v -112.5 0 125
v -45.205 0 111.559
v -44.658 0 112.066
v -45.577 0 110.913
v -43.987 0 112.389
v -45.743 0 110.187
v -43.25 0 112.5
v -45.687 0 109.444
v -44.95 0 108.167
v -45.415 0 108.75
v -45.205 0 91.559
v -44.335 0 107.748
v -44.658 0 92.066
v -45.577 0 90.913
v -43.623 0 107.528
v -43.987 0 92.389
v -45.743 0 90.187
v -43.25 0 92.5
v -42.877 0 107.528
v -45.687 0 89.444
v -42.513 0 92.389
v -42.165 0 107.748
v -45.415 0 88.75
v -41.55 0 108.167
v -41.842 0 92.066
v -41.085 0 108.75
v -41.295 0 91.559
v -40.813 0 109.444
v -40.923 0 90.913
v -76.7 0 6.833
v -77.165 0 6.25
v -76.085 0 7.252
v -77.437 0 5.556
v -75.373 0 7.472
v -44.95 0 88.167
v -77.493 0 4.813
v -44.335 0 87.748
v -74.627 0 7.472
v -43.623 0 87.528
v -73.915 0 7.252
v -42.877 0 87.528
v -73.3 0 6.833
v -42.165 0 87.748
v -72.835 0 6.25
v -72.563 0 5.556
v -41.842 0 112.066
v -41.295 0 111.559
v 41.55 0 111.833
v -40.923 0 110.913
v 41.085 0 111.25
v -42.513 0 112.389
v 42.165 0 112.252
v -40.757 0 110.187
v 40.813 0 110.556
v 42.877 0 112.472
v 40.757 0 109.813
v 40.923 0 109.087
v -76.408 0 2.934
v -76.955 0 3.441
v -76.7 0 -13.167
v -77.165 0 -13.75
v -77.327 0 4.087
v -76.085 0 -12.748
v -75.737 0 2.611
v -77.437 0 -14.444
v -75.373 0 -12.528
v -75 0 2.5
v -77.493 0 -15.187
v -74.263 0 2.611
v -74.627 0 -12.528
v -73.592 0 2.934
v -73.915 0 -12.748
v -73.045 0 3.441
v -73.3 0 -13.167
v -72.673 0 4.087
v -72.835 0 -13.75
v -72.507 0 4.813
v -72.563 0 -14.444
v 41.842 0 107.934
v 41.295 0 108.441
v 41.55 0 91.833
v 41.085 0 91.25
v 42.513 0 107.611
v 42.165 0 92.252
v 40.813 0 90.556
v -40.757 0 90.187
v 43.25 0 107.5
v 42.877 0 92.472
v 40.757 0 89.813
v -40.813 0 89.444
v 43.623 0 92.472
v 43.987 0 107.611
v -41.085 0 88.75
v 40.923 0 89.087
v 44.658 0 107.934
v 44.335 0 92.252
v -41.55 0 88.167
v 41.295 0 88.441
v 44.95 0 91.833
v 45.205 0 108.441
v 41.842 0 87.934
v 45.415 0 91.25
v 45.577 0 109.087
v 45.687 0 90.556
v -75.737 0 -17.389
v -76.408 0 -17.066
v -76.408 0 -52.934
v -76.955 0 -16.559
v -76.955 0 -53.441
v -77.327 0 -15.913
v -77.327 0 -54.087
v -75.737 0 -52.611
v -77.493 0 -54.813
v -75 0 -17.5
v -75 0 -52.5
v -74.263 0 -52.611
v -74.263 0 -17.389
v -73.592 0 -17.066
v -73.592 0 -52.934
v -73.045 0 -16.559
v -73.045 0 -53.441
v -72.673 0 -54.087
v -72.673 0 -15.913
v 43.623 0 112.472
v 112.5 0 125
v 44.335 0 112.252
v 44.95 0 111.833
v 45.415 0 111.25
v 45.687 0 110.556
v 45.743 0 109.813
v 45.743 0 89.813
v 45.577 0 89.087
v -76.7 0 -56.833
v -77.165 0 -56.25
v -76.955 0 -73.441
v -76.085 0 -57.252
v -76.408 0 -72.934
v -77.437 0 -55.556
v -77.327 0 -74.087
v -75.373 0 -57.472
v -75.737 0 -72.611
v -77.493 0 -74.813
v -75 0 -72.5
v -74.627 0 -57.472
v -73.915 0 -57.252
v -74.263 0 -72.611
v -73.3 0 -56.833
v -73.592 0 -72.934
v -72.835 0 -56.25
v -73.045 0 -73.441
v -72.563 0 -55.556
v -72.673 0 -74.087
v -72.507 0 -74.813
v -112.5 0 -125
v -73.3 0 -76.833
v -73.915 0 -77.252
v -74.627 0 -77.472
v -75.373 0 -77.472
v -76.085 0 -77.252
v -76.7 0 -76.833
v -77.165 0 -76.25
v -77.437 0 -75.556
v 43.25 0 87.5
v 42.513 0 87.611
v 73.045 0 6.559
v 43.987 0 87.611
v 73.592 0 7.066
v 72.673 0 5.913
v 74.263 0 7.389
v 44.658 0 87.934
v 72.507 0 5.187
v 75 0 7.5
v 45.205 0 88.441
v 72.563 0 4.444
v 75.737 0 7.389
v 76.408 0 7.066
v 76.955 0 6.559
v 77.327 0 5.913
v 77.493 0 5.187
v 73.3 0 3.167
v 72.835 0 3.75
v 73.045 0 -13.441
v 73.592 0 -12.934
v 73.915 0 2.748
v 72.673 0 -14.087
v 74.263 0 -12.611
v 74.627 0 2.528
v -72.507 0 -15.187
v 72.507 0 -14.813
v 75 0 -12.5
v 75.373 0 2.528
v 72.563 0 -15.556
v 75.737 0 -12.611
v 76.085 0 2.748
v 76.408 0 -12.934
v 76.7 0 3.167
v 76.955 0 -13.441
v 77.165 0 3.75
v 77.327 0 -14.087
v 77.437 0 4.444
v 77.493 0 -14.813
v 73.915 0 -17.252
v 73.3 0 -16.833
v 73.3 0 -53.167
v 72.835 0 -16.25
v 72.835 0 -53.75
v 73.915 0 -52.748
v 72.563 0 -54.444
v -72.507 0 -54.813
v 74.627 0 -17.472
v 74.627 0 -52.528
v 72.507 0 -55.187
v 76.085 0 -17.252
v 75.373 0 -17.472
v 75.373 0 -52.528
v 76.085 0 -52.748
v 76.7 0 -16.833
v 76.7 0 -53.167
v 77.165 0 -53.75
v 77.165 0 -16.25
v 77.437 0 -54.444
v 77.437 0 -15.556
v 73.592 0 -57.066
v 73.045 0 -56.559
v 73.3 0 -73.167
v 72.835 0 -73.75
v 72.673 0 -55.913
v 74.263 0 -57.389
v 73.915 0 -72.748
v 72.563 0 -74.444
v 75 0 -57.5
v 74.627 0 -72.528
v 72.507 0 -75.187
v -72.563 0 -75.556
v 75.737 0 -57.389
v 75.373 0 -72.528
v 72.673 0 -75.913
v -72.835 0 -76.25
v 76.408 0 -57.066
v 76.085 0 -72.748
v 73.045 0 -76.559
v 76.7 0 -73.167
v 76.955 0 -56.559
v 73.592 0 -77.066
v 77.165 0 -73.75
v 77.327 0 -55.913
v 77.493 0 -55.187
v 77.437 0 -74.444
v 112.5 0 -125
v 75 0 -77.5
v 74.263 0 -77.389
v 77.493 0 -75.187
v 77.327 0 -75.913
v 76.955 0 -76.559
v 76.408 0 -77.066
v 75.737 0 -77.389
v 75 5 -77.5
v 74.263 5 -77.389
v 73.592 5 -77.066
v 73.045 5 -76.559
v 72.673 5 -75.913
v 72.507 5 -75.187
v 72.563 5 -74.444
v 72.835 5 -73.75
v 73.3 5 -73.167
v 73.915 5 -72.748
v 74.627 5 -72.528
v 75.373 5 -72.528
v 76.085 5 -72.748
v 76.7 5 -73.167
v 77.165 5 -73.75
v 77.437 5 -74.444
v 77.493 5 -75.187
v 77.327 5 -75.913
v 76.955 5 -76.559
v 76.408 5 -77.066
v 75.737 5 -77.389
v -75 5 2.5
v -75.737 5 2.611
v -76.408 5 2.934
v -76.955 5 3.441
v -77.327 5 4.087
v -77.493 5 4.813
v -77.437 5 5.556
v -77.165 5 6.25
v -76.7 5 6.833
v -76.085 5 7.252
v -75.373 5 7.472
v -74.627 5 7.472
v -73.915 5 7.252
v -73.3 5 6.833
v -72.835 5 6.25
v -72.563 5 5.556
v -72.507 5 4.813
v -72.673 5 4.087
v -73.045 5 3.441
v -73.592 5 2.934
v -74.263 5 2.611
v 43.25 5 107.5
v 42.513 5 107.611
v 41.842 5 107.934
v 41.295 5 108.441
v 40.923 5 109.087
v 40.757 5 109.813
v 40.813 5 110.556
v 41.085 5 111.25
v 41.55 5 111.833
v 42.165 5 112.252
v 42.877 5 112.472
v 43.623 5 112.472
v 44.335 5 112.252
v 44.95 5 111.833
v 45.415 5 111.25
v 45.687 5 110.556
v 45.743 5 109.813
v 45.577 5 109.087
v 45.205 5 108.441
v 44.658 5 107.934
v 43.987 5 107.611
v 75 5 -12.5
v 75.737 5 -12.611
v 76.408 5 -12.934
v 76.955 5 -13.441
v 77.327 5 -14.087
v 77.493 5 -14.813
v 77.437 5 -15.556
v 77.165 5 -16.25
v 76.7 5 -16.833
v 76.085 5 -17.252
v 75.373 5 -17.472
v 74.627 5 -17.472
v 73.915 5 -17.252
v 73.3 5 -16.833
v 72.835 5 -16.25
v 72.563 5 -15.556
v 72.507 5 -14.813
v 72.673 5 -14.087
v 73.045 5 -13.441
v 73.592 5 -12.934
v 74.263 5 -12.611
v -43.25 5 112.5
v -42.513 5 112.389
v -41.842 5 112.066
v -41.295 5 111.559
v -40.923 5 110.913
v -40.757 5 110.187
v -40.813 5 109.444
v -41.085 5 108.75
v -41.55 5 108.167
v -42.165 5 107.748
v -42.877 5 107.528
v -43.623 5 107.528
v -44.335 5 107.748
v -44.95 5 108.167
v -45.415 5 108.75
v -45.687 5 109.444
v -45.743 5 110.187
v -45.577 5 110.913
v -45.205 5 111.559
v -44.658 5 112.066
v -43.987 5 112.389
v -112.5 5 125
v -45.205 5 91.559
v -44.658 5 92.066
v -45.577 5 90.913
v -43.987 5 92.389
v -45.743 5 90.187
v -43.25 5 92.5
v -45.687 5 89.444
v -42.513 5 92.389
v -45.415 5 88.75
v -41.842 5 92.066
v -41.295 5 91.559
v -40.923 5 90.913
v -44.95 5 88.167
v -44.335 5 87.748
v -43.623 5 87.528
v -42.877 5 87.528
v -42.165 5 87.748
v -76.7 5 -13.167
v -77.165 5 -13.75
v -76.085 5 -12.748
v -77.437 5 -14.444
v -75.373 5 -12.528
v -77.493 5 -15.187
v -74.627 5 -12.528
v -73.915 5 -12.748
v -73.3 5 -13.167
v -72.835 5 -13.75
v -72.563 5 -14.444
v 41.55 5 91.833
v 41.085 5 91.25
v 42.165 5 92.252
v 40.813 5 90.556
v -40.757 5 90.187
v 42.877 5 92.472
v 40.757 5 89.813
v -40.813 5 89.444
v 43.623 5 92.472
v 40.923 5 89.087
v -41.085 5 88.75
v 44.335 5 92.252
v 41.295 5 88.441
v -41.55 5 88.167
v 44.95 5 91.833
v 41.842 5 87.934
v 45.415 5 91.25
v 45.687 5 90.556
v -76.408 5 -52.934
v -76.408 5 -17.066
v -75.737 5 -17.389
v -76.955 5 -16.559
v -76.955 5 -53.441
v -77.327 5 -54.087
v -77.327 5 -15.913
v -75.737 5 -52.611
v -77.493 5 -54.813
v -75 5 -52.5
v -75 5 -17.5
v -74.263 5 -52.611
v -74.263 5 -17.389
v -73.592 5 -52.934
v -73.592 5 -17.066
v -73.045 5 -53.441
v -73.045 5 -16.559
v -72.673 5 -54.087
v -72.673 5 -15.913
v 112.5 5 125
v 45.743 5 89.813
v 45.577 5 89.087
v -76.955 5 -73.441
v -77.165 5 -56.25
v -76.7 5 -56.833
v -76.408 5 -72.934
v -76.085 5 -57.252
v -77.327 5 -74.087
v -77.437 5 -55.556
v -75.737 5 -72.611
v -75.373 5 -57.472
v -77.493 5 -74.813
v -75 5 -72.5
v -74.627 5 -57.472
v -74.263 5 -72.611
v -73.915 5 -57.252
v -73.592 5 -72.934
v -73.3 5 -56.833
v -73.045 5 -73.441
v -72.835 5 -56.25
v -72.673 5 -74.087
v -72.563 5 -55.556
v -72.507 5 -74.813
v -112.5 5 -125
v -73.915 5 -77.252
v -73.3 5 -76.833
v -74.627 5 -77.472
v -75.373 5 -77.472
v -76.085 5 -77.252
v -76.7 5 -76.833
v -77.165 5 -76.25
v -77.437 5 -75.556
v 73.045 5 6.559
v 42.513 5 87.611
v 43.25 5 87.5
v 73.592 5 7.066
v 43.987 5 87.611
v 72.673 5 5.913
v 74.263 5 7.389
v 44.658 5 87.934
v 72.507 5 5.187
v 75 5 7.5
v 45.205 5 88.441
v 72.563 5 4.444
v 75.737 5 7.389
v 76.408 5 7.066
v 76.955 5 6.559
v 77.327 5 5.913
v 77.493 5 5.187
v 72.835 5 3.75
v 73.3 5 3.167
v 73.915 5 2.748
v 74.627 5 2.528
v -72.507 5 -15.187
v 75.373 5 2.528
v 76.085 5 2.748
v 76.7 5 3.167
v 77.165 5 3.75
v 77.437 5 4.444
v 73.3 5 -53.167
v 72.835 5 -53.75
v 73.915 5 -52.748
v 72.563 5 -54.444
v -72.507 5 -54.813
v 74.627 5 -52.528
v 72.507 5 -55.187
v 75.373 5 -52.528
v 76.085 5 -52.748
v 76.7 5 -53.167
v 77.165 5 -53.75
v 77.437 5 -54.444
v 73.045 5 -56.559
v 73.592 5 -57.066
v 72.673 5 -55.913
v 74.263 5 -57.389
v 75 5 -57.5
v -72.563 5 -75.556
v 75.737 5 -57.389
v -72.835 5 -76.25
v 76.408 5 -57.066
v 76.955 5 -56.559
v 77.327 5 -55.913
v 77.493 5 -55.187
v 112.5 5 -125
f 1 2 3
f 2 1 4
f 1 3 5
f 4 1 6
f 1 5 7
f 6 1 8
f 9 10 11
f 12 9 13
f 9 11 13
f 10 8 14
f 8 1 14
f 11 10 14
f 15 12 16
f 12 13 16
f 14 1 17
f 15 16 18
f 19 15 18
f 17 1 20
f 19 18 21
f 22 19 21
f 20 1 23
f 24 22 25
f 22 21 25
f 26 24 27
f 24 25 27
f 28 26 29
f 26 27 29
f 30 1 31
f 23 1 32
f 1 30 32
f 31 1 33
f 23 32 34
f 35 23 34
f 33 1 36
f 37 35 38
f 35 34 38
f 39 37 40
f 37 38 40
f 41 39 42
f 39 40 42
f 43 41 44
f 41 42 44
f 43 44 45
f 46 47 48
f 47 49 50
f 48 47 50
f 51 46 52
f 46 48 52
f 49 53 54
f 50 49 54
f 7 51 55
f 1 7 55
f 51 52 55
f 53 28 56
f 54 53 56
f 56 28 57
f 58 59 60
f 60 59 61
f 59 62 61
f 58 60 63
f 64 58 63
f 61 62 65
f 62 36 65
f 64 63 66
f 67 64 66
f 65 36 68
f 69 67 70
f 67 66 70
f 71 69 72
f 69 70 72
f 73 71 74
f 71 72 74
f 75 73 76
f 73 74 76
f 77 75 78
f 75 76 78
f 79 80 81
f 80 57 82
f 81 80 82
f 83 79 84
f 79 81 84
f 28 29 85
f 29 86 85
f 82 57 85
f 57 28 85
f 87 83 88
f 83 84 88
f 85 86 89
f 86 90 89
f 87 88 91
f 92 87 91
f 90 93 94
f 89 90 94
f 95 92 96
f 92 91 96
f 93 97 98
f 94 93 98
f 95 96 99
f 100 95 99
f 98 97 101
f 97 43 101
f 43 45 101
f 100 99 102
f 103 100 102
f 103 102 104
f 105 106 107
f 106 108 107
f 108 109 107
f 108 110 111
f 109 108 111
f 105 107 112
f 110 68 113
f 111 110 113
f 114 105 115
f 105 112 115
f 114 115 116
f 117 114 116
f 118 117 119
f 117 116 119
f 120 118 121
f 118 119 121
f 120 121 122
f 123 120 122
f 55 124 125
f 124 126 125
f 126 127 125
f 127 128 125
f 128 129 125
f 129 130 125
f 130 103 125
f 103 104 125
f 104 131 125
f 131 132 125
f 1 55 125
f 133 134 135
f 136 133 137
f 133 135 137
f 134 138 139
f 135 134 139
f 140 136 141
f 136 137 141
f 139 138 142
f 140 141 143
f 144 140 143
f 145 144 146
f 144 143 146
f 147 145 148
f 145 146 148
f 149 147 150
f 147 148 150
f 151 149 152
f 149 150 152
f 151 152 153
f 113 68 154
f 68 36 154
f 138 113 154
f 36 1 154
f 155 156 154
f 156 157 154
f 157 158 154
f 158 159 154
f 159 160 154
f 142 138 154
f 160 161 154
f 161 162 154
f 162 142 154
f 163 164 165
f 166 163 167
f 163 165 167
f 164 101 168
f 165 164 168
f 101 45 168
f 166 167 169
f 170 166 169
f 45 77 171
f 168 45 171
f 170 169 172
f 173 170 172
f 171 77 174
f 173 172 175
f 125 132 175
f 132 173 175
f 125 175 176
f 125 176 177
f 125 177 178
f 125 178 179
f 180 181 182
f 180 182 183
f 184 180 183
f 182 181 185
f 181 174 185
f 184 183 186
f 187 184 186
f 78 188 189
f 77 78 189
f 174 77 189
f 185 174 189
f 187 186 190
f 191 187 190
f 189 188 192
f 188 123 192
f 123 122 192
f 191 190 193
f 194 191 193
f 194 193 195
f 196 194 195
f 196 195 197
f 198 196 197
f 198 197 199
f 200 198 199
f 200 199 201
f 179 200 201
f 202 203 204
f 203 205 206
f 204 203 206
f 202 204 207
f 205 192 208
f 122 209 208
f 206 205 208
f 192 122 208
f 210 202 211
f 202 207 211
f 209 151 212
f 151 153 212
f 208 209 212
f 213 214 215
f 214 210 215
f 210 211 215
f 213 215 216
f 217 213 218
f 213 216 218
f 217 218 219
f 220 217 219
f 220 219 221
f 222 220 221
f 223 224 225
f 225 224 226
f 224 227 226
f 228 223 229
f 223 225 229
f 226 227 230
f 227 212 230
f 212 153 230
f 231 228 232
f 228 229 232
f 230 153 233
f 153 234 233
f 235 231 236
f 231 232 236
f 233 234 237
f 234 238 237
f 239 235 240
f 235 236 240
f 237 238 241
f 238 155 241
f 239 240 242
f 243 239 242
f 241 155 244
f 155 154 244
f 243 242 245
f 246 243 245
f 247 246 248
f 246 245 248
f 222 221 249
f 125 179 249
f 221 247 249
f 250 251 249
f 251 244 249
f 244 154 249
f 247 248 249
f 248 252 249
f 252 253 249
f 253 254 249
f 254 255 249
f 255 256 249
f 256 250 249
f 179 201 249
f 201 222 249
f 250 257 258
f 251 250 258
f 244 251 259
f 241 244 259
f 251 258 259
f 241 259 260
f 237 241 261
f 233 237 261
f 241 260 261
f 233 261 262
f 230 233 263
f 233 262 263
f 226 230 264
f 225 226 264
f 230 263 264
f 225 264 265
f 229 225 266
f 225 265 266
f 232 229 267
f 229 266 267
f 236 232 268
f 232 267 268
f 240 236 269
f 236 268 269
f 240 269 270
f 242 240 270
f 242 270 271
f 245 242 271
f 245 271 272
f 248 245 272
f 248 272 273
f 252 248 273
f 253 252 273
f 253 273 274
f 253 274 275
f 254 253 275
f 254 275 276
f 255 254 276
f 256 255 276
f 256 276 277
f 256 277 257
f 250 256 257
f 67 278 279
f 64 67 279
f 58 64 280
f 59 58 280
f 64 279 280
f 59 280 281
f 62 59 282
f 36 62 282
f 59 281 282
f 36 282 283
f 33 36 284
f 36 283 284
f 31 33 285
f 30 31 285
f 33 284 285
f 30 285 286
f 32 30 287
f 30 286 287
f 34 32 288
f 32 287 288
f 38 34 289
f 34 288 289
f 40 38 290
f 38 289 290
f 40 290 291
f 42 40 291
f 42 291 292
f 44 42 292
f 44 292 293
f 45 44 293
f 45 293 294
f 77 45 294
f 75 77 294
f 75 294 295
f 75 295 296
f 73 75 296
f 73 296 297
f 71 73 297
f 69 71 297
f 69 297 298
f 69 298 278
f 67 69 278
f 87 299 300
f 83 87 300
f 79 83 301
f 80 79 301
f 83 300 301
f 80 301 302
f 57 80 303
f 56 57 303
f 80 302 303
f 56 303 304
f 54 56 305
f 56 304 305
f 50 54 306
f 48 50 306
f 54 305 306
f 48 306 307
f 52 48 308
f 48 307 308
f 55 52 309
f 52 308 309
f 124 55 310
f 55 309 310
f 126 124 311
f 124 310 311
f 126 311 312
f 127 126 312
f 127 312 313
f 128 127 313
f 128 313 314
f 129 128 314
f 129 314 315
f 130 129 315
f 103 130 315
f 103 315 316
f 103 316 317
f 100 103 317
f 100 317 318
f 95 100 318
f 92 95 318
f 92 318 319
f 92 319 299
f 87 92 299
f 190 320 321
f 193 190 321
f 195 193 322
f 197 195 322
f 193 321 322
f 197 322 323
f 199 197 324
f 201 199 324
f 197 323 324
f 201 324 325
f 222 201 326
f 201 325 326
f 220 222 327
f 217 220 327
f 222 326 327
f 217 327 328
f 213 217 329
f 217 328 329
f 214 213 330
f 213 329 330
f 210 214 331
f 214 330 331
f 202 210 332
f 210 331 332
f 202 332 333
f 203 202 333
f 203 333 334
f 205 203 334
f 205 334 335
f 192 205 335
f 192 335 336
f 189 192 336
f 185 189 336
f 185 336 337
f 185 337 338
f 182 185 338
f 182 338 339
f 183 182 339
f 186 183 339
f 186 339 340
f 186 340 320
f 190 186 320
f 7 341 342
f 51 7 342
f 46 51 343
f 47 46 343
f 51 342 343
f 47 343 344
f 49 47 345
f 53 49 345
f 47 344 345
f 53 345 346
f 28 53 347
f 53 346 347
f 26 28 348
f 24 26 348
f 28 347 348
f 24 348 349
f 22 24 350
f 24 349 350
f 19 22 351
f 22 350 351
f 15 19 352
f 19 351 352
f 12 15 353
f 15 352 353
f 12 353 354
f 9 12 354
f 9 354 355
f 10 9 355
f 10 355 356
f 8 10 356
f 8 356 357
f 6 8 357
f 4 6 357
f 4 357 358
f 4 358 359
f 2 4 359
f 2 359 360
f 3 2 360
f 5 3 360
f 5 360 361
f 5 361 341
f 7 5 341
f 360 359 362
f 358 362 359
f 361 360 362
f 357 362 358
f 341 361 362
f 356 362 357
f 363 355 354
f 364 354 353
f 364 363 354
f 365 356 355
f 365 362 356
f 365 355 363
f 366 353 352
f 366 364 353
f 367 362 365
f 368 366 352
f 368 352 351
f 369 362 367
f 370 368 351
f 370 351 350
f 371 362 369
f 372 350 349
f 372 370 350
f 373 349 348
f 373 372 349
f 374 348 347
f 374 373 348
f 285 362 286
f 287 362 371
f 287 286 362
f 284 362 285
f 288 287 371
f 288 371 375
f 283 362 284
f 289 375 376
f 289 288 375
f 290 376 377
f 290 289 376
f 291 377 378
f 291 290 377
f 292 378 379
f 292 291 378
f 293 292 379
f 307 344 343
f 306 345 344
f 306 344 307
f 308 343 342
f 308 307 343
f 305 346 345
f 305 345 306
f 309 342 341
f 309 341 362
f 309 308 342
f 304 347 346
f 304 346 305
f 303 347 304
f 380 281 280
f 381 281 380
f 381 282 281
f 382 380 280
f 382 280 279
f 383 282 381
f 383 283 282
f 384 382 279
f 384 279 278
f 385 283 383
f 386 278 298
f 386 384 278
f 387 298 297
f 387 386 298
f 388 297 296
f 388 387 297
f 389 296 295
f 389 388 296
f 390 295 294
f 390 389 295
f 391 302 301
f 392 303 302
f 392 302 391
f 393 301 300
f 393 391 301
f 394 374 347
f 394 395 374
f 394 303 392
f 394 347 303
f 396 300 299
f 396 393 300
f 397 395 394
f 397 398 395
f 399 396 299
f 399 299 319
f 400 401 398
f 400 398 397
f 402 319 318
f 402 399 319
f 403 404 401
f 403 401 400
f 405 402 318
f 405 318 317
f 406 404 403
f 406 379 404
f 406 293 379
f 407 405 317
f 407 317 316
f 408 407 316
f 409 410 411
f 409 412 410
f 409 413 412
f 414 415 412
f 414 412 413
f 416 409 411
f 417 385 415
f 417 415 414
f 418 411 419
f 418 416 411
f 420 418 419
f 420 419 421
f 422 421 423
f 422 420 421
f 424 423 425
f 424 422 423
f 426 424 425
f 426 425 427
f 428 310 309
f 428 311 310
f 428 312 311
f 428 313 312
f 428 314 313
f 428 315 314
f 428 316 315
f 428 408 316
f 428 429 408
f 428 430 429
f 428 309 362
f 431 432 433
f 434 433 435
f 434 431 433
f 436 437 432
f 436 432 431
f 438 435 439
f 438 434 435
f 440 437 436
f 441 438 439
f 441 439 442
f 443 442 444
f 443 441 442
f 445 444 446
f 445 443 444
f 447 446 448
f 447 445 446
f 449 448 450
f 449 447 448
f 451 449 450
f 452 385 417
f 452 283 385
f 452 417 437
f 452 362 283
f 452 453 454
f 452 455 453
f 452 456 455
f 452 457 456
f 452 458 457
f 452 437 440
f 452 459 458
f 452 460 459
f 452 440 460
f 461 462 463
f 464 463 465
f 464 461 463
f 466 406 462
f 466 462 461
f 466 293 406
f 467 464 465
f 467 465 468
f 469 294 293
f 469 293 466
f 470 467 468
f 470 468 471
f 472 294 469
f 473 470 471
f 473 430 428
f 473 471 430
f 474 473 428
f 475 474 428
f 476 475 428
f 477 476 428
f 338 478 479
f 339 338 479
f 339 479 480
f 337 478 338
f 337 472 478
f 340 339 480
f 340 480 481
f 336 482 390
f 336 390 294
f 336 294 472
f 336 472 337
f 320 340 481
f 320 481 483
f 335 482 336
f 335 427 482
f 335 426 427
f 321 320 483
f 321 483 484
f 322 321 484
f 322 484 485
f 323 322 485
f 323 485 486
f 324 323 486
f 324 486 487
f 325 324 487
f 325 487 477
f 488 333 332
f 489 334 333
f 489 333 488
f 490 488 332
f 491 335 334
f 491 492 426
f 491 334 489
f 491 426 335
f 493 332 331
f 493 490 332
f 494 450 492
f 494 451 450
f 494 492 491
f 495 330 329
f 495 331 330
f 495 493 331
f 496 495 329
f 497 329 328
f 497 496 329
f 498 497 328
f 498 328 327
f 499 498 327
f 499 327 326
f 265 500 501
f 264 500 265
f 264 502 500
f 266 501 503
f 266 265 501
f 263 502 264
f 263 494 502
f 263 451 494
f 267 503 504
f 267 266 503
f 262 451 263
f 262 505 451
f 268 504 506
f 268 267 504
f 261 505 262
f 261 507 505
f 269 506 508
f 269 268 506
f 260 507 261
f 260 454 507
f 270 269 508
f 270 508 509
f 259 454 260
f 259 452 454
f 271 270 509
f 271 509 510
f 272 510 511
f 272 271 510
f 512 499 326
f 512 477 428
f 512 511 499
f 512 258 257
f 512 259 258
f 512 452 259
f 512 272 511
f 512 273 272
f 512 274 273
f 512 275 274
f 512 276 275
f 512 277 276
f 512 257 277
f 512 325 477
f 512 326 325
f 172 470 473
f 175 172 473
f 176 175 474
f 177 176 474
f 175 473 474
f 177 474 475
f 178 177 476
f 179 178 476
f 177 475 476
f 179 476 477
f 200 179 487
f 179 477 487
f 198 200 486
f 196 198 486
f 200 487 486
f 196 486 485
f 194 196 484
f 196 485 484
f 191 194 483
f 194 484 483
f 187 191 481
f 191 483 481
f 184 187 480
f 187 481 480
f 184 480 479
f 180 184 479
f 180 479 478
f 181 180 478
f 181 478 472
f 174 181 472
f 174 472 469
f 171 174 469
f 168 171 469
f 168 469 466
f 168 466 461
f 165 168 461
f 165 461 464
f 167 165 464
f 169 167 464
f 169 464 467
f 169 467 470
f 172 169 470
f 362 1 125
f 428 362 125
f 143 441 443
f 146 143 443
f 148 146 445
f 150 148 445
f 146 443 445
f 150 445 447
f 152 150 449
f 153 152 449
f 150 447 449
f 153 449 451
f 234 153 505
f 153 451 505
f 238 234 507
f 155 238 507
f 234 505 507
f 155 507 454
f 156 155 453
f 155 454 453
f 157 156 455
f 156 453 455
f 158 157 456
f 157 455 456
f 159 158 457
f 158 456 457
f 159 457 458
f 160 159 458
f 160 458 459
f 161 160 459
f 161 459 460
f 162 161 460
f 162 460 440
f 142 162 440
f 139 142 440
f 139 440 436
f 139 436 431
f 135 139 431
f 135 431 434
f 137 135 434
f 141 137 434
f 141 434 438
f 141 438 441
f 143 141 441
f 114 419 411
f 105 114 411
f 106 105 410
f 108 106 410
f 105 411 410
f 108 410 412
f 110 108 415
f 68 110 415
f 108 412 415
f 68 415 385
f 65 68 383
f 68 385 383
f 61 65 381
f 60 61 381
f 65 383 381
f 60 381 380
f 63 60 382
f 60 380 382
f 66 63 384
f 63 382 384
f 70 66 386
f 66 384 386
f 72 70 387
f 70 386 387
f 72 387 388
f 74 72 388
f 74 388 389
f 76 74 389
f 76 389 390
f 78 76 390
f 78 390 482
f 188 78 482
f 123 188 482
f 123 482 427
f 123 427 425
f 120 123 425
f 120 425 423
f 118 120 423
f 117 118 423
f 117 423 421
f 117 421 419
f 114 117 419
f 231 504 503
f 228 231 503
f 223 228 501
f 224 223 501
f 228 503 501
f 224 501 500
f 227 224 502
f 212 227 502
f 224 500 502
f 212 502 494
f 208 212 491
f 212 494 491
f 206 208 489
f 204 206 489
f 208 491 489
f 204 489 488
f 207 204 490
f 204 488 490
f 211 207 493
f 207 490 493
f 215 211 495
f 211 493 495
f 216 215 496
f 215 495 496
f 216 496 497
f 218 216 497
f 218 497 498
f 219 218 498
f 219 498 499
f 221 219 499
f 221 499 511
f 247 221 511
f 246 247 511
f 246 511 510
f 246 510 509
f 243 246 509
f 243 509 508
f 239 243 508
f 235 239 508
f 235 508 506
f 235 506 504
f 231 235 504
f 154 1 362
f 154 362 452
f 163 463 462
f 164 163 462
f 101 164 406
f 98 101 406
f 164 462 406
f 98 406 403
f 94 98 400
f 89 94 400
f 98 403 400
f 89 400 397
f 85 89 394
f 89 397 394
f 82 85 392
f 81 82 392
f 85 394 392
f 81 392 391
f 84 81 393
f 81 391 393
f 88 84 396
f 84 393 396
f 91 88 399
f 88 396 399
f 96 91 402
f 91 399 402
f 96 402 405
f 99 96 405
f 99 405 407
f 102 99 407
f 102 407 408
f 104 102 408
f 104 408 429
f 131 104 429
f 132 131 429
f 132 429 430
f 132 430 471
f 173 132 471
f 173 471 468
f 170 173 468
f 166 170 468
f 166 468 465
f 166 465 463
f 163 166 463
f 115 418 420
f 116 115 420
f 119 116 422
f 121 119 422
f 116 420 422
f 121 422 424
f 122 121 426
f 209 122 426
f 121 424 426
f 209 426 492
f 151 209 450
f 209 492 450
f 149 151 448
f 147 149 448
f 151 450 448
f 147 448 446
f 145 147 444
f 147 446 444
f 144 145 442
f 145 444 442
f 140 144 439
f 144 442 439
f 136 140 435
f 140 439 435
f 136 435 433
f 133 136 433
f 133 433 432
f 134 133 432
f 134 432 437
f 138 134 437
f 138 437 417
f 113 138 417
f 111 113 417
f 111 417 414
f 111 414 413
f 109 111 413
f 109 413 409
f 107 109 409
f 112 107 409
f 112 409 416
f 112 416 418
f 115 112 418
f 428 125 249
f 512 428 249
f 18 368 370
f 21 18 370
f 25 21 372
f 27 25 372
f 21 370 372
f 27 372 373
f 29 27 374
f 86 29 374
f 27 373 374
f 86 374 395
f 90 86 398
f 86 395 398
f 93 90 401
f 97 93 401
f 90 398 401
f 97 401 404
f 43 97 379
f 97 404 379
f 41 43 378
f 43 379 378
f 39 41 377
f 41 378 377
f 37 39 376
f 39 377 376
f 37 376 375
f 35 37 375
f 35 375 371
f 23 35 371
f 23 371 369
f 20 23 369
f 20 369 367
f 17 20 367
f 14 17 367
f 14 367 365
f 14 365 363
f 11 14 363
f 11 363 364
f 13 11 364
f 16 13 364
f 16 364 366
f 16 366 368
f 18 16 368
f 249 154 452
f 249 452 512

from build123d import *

# Parameters (mm, degrees)
SKETCH1_W            = 225
SKETCH1_H            = 250
BODY_DEPTH           = 5
SKETCH2_R            = 2.5
FIXATION_HOLES_DEPTH = 169.244613584
SKETCH3_R            = 2.5
HOLES_DEPTH          = 169.244613584


with BuildPart() as part:
    # Sketch1 → Body (new body)
    with BuildSketch(Plane(origin=(0, 0, 0), x_dir=(1, 0, 0), z_dir=(0, 1, 0))):
        Rectangle(SKETCH1_W, SKETCH1_H)
    extrude(amount=BODY_DEPTH)

    # Sketch2 → Fixation_Holes (cut, through all)
    with BuildSketch(Plane(origin=(0, 5, 0), x_dir=(1, 0, 0), z_dir=(0, 1, 0))):
        with Locations(Location((-75, 75, 0), (0, 0, 270))):
            Circle(SKETCH2_R)
        with Locations(Location((-75, 55, 0), (0, 0, 270))):
            Circle(SKETCH2_R)
        with Locations(Location((75, 55, 0), (0, 0, 90))):
            Circle(SKETCH2_R)
        with Locations(Location((75, 75, 0), (0, 0, 90))):
            Circle(SKETCH2_R)
        with Locations(Location((75, -5, 0), (0, 0, 270))):
            Circle(SKETCH2_R)
        with Locations(Location((75, 15, 0), (0, 0, 270))):
            Circle(SKETCH2_R)
        with Locations(Location((-75, -5, 0), (0, 0, 90))):
            Circle(SKETCH2_R)
        with Locations(Location((-75, 15, 0), (0, 0, 90))):
            Circle(SKETCH2_R)
    extrude(amount=-FIXATION_HOLES_DEPTH, mode=Mode.SUBTRACT)

    # Sketch3 → Holes (cut, through all)
    with BuildSketch(Plane(origin=(0, 5, 0), x_dir=(1, 0, 0), z_dir=(0, 1, 0))):
        with Locations(Location((-43.25, -90, 0), (0, 0, 270))):
            Circle(SKETCH3_R)
        with Locations(Location((-43.25, -110, 0), (0, 0, 270))):
            Circle(SKETCH3_R)
        with Locations(Location((43.25, -90, 0), (0, 0, 90))):
            Circle(SKETCH3_R)
        with Locations(Location((43.25, -110, 0), (0, 0, 90))):
            Circle(SKETCH3_R)
    extrude(amount=-HOLES_DEPTH, mode=Mode.SUBTRACT)


solid = part.part
